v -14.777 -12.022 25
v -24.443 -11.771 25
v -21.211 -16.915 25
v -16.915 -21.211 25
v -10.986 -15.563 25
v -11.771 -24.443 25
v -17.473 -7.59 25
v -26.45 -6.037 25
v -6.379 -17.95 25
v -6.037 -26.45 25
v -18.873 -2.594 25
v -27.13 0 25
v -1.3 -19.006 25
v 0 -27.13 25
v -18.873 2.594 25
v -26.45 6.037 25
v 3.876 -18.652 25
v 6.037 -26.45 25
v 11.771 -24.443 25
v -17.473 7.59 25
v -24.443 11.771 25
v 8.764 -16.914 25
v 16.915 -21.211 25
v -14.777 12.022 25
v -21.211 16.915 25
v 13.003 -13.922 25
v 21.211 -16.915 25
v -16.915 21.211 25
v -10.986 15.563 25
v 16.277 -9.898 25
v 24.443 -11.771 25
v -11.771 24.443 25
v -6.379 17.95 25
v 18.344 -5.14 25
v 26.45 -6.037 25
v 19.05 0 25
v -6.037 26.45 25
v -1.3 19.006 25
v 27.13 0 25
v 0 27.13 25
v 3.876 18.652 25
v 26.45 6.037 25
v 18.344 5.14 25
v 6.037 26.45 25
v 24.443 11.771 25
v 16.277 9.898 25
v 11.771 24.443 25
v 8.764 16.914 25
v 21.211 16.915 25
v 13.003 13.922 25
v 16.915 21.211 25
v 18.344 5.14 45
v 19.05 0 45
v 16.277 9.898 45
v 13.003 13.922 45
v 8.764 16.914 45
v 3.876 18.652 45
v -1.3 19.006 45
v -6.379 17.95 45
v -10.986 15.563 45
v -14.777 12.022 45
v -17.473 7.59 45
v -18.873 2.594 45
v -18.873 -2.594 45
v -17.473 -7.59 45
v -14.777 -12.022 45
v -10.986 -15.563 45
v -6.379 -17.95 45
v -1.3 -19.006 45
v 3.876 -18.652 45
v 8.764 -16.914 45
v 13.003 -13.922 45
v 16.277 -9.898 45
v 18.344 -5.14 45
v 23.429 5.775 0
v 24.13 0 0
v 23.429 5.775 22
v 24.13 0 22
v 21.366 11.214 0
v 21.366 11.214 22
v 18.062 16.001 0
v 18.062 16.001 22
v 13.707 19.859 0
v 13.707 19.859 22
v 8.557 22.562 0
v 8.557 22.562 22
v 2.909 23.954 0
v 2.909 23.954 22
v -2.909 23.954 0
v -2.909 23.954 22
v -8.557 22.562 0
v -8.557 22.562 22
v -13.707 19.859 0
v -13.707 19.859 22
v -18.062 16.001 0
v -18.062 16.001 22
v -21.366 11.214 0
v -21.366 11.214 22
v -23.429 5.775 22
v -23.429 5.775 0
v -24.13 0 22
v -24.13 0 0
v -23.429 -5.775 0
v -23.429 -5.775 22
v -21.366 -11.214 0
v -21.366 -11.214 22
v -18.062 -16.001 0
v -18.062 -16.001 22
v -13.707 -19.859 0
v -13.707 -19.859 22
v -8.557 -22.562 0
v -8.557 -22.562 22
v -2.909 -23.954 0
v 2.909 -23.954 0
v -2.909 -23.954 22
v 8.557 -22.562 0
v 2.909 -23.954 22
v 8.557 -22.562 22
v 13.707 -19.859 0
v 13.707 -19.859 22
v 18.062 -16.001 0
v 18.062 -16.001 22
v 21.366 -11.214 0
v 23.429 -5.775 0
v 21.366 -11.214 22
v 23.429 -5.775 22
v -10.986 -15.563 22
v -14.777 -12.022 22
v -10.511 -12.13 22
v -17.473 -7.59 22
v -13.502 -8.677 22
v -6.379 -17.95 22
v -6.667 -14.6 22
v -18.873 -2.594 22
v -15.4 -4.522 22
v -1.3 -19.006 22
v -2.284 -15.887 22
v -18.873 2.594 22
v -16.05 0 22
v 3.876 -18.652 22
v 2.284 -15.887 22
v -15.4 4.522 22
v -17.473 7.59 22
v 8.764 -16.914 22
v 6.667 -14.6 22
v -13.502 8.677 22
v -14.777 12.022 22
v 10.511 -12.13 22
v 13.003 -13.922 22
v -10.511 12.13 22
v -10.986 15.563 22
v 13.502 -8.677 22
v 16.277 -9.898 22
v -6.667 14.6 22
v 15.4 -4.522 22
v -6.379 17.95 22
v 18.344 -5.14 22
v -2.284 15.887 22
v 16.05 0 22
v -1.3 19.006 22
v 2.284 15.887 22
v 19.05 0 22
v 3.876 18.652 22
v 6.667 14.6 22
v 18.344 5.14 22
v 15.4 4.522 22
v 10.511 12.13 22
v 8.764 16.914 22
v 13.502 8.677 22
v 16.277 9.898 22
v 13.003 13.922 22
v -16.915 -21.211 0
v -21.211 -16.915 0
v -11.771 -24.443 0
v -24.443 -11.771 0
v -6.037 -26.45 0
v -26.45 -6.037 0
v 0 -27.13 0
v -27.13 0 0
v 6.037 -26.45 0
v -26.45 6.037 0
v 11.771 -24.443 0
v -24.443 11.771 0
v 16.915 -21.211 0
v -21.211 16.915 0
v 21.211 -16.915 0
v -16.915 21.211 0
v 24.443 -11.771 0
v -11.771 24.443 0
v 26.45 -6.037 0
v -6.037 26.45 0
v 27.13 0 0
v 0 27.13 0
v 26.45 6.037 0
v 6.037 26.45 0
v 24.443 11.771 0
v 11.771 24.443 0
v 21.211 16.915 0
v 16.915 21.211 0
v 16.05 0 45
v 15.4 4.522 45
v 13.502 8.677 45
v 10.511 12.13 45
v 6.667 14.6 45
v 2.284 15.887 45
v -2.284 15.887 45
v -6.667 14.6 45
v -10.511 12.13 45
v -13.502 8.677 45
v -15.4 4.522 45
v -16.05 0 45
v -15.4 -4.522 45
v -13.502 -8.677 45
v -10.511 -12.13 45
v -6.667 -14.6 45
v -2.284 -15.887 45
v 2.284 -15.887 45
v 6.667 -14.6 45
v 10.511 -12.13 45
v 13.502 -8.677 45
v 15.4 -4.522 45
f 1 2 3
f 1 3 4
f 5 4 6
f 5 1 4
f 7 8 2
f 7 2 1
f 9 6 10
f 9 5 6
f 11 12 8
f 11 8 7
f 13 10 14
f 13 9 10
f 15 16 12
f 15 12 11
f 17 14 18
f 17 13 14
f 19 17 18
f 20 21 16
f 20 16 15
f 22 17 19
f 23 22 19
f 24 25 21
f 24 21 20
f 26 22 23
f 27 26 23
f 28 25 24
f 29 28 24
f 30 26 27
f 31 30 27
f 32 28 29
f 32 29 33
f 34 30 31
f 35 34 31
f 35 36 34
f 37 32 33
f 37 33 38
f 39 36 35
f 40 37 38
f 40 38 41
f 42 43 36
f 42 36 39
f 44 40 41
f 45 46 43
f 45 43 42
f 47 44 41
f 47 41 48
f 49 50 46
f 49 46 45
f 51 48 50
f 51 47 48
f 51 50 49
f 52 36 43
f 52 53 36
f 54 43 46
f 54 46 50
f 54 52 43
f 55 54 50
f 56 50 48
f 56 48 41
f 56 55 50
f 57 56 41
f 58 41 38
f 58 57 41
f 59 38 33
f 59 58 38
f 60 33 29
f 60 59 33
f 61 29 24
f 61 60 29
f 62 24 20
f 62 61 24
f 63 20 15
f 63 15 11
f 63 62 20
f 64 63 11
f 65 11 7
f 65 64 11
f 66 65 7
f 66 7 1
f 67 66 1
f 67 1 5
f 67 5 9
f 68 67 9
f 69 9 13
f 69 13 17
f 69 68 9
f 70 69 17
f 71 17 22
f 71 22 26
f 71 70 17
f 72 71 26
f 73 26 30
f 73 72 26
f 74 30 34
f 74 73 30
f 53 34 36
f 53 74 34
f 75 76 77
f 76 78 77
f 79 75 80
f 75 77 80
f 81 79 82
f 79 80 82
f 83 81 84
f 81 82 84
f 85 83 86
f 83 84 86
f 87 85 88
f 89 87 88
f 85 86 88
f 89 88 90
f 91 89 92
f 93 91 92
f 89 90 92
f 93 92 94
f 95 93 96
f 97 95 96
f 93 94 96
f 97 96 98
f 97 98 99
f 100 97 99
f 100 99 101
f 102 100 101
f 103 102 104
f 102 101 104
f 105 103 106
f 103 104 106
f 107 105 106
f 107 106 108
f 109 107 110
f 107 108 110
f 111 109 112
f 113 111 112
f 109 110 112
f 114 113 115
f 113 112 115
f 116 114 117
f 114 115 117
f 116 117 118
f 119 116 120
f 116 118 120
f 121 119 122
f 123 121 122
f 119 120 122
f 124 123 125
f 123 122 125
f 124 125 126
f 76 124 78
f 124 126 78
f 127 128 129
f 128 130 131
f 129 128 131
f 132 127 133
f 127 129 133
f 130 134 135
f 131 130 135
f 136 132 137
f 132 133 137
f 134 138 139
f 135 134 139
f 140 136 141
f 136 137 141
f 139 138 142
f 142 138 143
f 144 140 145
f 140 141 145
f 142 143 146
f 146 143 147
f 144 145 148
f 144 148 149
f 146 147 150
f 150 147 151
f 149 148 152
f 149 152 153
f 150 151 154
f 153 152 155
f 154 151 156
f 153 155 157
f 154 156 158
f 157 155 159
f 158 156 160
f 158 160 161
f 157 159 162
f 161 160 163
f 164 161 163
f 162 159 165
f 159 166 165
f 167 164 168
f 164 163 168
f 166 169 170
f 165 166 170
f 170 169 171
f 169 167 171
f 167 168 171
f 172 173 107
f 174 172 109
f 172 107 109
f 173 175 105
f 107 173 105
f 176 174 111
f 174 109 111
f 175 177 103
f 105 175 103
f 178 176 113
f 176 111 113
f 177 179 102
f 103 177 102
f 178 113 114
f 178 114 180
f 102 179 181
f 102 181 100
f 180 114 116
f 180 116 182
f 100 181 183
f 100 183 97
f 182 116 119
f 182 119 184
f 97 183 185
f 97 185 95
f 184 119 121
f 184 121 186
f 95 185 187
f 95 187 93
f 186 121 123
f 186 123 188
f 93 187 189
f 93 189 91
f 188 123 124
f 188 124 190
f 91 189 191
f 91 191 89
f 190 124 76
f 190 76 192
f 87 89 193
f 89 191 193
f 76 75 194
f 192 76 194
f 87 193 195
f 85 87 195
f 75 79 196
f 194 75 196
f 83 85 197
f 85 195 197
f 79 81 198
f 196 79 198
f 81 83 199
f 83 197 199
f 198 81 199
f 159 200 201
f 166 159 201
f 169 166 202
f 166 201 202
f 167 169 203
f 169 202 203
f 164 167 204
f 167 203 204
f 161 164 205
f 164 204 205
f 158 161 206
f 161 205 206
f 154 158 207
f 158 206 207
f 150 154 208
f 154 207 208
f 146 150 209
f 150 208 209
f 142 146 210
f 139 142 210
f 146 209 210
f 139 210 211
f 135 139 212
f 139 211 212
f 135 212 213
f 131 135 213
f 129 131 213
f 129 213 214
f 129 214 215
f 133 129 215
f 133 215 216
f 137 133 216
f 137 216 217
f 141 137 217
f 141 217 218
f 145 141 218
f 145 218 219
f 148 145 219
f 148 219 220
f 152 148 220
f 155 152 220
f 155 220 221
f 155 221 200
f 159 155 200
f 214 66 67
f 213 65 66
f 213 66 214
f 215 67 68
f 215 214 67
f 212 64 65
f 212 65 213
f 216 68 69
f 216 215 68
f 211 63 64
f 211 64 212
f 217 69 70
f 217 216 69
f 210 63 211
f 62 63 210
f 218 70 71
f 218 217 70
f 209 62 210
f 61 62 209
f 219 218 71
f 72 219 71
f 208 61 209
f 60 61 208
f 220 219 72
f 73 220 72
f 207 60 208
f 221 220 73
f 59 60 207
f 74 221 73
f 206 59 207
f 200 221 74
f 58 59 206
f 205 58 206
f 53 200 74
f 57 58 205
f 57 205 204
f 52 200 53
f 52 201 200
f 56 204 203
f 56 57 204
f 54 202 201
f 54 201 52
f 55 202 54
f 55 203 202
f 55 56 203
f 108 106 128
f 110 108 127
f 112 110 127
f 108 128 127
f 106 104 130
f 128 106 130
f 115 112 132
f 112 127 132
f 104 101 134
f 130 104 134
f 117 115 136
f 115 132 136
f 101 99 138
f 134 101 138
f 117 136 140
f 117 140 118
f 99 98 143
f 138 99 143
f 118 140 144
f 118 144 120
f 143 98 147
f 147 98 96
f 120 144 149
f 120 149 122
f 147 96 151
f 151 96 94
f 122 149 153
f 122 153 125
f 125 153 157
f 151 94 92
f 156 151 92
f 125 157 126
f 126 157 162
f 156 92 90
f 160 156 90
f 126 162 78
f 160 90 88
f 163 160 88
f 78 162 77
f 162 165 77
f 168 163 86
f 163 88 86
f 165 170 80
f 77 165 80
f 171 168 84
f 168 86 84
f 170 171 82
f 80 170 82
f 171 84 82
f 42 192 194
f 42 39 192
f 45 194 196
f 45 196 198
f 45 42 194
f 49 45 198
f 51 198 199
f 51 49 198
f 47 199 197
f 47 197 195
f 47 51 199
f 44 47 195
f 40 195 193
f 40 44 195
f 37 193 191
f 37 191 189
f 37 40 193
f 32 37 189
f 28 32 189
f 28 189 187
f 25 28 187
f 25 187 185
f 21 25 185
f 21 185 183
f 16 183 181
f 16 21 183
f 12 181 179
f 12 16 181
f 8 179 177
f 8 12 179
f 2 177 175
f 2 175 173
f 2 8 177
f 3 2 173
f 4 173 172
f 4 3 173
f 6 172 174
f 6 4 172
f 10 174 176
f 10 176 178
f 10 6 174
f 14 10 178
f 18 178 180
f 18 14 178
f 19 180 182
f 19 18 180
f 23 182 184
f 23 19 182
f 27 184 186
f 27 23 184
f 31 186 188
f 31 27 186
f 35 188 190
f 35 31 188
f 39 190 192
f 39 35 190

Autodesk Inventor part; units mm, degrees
ref_plane "YZ Plane" through (0, 0, 0) normal (1, 0, 0) x (0, 1, 0)
ref_plane "XZ Plane" through (0, 0, 0) normal (0, 1, 0) x (-1, 0, 0)
ref_plane "XY Plane" through (0, 0, 0) normal (0, 0, 1) x (1, 0, 0)
sketch "Sketch1" plane through (0, 0, 0) normal (0, 1, 0) x (-1, 0, 0)
  line L0 (0, 0) -> (-24.13, 0) construction
  line L1 (-24.13, 0) -> (-24.13, 22)
  line L2 (-19.05, 25) -> (-19.05, 45)
  line L3 (-24.13, 0) -> (-27.13, 0)
  line L4 (-27.13, 0) -> (-27.13, 25)
  line L5 (-27.13, 25) -> (-19.05, 25)
  line L6 (-27.13, 25) -> (-27.13, 25)
  line L7 (-27.13, 25) -> (-19.05, 25)
  line L8 (-19.05, 25) -> (-19.05, 25)
  line L9 (-19.05, 22) -> (-24.13, 22)
  line L10 (-16.05, 22) -> (-16.05, 45)
  line L11 (-19.05, 22) -> (-16.05, 22)
  line L12 (-16.05, 45) -> (-19.05, 45)
  line L13 (0, -9) -> (0, 54) projected
  dimension "d3" = 24.13
  dimension "d6" = 20
  dimension "d7" = 3
  dimension "d8" = 25
revolve "Revolution1" add sketch "Sketch1" angle 360 about axis through (0, 0, -10) along (0, 0, 1)
thread "Thread1" size "1 1/2" designation "1 1/2 - 11.5 NPT" standard "NPT for PVC Pipe and Fitting" length 26.04
properties part number "1-1&2 FEMALE ADAPTER"
